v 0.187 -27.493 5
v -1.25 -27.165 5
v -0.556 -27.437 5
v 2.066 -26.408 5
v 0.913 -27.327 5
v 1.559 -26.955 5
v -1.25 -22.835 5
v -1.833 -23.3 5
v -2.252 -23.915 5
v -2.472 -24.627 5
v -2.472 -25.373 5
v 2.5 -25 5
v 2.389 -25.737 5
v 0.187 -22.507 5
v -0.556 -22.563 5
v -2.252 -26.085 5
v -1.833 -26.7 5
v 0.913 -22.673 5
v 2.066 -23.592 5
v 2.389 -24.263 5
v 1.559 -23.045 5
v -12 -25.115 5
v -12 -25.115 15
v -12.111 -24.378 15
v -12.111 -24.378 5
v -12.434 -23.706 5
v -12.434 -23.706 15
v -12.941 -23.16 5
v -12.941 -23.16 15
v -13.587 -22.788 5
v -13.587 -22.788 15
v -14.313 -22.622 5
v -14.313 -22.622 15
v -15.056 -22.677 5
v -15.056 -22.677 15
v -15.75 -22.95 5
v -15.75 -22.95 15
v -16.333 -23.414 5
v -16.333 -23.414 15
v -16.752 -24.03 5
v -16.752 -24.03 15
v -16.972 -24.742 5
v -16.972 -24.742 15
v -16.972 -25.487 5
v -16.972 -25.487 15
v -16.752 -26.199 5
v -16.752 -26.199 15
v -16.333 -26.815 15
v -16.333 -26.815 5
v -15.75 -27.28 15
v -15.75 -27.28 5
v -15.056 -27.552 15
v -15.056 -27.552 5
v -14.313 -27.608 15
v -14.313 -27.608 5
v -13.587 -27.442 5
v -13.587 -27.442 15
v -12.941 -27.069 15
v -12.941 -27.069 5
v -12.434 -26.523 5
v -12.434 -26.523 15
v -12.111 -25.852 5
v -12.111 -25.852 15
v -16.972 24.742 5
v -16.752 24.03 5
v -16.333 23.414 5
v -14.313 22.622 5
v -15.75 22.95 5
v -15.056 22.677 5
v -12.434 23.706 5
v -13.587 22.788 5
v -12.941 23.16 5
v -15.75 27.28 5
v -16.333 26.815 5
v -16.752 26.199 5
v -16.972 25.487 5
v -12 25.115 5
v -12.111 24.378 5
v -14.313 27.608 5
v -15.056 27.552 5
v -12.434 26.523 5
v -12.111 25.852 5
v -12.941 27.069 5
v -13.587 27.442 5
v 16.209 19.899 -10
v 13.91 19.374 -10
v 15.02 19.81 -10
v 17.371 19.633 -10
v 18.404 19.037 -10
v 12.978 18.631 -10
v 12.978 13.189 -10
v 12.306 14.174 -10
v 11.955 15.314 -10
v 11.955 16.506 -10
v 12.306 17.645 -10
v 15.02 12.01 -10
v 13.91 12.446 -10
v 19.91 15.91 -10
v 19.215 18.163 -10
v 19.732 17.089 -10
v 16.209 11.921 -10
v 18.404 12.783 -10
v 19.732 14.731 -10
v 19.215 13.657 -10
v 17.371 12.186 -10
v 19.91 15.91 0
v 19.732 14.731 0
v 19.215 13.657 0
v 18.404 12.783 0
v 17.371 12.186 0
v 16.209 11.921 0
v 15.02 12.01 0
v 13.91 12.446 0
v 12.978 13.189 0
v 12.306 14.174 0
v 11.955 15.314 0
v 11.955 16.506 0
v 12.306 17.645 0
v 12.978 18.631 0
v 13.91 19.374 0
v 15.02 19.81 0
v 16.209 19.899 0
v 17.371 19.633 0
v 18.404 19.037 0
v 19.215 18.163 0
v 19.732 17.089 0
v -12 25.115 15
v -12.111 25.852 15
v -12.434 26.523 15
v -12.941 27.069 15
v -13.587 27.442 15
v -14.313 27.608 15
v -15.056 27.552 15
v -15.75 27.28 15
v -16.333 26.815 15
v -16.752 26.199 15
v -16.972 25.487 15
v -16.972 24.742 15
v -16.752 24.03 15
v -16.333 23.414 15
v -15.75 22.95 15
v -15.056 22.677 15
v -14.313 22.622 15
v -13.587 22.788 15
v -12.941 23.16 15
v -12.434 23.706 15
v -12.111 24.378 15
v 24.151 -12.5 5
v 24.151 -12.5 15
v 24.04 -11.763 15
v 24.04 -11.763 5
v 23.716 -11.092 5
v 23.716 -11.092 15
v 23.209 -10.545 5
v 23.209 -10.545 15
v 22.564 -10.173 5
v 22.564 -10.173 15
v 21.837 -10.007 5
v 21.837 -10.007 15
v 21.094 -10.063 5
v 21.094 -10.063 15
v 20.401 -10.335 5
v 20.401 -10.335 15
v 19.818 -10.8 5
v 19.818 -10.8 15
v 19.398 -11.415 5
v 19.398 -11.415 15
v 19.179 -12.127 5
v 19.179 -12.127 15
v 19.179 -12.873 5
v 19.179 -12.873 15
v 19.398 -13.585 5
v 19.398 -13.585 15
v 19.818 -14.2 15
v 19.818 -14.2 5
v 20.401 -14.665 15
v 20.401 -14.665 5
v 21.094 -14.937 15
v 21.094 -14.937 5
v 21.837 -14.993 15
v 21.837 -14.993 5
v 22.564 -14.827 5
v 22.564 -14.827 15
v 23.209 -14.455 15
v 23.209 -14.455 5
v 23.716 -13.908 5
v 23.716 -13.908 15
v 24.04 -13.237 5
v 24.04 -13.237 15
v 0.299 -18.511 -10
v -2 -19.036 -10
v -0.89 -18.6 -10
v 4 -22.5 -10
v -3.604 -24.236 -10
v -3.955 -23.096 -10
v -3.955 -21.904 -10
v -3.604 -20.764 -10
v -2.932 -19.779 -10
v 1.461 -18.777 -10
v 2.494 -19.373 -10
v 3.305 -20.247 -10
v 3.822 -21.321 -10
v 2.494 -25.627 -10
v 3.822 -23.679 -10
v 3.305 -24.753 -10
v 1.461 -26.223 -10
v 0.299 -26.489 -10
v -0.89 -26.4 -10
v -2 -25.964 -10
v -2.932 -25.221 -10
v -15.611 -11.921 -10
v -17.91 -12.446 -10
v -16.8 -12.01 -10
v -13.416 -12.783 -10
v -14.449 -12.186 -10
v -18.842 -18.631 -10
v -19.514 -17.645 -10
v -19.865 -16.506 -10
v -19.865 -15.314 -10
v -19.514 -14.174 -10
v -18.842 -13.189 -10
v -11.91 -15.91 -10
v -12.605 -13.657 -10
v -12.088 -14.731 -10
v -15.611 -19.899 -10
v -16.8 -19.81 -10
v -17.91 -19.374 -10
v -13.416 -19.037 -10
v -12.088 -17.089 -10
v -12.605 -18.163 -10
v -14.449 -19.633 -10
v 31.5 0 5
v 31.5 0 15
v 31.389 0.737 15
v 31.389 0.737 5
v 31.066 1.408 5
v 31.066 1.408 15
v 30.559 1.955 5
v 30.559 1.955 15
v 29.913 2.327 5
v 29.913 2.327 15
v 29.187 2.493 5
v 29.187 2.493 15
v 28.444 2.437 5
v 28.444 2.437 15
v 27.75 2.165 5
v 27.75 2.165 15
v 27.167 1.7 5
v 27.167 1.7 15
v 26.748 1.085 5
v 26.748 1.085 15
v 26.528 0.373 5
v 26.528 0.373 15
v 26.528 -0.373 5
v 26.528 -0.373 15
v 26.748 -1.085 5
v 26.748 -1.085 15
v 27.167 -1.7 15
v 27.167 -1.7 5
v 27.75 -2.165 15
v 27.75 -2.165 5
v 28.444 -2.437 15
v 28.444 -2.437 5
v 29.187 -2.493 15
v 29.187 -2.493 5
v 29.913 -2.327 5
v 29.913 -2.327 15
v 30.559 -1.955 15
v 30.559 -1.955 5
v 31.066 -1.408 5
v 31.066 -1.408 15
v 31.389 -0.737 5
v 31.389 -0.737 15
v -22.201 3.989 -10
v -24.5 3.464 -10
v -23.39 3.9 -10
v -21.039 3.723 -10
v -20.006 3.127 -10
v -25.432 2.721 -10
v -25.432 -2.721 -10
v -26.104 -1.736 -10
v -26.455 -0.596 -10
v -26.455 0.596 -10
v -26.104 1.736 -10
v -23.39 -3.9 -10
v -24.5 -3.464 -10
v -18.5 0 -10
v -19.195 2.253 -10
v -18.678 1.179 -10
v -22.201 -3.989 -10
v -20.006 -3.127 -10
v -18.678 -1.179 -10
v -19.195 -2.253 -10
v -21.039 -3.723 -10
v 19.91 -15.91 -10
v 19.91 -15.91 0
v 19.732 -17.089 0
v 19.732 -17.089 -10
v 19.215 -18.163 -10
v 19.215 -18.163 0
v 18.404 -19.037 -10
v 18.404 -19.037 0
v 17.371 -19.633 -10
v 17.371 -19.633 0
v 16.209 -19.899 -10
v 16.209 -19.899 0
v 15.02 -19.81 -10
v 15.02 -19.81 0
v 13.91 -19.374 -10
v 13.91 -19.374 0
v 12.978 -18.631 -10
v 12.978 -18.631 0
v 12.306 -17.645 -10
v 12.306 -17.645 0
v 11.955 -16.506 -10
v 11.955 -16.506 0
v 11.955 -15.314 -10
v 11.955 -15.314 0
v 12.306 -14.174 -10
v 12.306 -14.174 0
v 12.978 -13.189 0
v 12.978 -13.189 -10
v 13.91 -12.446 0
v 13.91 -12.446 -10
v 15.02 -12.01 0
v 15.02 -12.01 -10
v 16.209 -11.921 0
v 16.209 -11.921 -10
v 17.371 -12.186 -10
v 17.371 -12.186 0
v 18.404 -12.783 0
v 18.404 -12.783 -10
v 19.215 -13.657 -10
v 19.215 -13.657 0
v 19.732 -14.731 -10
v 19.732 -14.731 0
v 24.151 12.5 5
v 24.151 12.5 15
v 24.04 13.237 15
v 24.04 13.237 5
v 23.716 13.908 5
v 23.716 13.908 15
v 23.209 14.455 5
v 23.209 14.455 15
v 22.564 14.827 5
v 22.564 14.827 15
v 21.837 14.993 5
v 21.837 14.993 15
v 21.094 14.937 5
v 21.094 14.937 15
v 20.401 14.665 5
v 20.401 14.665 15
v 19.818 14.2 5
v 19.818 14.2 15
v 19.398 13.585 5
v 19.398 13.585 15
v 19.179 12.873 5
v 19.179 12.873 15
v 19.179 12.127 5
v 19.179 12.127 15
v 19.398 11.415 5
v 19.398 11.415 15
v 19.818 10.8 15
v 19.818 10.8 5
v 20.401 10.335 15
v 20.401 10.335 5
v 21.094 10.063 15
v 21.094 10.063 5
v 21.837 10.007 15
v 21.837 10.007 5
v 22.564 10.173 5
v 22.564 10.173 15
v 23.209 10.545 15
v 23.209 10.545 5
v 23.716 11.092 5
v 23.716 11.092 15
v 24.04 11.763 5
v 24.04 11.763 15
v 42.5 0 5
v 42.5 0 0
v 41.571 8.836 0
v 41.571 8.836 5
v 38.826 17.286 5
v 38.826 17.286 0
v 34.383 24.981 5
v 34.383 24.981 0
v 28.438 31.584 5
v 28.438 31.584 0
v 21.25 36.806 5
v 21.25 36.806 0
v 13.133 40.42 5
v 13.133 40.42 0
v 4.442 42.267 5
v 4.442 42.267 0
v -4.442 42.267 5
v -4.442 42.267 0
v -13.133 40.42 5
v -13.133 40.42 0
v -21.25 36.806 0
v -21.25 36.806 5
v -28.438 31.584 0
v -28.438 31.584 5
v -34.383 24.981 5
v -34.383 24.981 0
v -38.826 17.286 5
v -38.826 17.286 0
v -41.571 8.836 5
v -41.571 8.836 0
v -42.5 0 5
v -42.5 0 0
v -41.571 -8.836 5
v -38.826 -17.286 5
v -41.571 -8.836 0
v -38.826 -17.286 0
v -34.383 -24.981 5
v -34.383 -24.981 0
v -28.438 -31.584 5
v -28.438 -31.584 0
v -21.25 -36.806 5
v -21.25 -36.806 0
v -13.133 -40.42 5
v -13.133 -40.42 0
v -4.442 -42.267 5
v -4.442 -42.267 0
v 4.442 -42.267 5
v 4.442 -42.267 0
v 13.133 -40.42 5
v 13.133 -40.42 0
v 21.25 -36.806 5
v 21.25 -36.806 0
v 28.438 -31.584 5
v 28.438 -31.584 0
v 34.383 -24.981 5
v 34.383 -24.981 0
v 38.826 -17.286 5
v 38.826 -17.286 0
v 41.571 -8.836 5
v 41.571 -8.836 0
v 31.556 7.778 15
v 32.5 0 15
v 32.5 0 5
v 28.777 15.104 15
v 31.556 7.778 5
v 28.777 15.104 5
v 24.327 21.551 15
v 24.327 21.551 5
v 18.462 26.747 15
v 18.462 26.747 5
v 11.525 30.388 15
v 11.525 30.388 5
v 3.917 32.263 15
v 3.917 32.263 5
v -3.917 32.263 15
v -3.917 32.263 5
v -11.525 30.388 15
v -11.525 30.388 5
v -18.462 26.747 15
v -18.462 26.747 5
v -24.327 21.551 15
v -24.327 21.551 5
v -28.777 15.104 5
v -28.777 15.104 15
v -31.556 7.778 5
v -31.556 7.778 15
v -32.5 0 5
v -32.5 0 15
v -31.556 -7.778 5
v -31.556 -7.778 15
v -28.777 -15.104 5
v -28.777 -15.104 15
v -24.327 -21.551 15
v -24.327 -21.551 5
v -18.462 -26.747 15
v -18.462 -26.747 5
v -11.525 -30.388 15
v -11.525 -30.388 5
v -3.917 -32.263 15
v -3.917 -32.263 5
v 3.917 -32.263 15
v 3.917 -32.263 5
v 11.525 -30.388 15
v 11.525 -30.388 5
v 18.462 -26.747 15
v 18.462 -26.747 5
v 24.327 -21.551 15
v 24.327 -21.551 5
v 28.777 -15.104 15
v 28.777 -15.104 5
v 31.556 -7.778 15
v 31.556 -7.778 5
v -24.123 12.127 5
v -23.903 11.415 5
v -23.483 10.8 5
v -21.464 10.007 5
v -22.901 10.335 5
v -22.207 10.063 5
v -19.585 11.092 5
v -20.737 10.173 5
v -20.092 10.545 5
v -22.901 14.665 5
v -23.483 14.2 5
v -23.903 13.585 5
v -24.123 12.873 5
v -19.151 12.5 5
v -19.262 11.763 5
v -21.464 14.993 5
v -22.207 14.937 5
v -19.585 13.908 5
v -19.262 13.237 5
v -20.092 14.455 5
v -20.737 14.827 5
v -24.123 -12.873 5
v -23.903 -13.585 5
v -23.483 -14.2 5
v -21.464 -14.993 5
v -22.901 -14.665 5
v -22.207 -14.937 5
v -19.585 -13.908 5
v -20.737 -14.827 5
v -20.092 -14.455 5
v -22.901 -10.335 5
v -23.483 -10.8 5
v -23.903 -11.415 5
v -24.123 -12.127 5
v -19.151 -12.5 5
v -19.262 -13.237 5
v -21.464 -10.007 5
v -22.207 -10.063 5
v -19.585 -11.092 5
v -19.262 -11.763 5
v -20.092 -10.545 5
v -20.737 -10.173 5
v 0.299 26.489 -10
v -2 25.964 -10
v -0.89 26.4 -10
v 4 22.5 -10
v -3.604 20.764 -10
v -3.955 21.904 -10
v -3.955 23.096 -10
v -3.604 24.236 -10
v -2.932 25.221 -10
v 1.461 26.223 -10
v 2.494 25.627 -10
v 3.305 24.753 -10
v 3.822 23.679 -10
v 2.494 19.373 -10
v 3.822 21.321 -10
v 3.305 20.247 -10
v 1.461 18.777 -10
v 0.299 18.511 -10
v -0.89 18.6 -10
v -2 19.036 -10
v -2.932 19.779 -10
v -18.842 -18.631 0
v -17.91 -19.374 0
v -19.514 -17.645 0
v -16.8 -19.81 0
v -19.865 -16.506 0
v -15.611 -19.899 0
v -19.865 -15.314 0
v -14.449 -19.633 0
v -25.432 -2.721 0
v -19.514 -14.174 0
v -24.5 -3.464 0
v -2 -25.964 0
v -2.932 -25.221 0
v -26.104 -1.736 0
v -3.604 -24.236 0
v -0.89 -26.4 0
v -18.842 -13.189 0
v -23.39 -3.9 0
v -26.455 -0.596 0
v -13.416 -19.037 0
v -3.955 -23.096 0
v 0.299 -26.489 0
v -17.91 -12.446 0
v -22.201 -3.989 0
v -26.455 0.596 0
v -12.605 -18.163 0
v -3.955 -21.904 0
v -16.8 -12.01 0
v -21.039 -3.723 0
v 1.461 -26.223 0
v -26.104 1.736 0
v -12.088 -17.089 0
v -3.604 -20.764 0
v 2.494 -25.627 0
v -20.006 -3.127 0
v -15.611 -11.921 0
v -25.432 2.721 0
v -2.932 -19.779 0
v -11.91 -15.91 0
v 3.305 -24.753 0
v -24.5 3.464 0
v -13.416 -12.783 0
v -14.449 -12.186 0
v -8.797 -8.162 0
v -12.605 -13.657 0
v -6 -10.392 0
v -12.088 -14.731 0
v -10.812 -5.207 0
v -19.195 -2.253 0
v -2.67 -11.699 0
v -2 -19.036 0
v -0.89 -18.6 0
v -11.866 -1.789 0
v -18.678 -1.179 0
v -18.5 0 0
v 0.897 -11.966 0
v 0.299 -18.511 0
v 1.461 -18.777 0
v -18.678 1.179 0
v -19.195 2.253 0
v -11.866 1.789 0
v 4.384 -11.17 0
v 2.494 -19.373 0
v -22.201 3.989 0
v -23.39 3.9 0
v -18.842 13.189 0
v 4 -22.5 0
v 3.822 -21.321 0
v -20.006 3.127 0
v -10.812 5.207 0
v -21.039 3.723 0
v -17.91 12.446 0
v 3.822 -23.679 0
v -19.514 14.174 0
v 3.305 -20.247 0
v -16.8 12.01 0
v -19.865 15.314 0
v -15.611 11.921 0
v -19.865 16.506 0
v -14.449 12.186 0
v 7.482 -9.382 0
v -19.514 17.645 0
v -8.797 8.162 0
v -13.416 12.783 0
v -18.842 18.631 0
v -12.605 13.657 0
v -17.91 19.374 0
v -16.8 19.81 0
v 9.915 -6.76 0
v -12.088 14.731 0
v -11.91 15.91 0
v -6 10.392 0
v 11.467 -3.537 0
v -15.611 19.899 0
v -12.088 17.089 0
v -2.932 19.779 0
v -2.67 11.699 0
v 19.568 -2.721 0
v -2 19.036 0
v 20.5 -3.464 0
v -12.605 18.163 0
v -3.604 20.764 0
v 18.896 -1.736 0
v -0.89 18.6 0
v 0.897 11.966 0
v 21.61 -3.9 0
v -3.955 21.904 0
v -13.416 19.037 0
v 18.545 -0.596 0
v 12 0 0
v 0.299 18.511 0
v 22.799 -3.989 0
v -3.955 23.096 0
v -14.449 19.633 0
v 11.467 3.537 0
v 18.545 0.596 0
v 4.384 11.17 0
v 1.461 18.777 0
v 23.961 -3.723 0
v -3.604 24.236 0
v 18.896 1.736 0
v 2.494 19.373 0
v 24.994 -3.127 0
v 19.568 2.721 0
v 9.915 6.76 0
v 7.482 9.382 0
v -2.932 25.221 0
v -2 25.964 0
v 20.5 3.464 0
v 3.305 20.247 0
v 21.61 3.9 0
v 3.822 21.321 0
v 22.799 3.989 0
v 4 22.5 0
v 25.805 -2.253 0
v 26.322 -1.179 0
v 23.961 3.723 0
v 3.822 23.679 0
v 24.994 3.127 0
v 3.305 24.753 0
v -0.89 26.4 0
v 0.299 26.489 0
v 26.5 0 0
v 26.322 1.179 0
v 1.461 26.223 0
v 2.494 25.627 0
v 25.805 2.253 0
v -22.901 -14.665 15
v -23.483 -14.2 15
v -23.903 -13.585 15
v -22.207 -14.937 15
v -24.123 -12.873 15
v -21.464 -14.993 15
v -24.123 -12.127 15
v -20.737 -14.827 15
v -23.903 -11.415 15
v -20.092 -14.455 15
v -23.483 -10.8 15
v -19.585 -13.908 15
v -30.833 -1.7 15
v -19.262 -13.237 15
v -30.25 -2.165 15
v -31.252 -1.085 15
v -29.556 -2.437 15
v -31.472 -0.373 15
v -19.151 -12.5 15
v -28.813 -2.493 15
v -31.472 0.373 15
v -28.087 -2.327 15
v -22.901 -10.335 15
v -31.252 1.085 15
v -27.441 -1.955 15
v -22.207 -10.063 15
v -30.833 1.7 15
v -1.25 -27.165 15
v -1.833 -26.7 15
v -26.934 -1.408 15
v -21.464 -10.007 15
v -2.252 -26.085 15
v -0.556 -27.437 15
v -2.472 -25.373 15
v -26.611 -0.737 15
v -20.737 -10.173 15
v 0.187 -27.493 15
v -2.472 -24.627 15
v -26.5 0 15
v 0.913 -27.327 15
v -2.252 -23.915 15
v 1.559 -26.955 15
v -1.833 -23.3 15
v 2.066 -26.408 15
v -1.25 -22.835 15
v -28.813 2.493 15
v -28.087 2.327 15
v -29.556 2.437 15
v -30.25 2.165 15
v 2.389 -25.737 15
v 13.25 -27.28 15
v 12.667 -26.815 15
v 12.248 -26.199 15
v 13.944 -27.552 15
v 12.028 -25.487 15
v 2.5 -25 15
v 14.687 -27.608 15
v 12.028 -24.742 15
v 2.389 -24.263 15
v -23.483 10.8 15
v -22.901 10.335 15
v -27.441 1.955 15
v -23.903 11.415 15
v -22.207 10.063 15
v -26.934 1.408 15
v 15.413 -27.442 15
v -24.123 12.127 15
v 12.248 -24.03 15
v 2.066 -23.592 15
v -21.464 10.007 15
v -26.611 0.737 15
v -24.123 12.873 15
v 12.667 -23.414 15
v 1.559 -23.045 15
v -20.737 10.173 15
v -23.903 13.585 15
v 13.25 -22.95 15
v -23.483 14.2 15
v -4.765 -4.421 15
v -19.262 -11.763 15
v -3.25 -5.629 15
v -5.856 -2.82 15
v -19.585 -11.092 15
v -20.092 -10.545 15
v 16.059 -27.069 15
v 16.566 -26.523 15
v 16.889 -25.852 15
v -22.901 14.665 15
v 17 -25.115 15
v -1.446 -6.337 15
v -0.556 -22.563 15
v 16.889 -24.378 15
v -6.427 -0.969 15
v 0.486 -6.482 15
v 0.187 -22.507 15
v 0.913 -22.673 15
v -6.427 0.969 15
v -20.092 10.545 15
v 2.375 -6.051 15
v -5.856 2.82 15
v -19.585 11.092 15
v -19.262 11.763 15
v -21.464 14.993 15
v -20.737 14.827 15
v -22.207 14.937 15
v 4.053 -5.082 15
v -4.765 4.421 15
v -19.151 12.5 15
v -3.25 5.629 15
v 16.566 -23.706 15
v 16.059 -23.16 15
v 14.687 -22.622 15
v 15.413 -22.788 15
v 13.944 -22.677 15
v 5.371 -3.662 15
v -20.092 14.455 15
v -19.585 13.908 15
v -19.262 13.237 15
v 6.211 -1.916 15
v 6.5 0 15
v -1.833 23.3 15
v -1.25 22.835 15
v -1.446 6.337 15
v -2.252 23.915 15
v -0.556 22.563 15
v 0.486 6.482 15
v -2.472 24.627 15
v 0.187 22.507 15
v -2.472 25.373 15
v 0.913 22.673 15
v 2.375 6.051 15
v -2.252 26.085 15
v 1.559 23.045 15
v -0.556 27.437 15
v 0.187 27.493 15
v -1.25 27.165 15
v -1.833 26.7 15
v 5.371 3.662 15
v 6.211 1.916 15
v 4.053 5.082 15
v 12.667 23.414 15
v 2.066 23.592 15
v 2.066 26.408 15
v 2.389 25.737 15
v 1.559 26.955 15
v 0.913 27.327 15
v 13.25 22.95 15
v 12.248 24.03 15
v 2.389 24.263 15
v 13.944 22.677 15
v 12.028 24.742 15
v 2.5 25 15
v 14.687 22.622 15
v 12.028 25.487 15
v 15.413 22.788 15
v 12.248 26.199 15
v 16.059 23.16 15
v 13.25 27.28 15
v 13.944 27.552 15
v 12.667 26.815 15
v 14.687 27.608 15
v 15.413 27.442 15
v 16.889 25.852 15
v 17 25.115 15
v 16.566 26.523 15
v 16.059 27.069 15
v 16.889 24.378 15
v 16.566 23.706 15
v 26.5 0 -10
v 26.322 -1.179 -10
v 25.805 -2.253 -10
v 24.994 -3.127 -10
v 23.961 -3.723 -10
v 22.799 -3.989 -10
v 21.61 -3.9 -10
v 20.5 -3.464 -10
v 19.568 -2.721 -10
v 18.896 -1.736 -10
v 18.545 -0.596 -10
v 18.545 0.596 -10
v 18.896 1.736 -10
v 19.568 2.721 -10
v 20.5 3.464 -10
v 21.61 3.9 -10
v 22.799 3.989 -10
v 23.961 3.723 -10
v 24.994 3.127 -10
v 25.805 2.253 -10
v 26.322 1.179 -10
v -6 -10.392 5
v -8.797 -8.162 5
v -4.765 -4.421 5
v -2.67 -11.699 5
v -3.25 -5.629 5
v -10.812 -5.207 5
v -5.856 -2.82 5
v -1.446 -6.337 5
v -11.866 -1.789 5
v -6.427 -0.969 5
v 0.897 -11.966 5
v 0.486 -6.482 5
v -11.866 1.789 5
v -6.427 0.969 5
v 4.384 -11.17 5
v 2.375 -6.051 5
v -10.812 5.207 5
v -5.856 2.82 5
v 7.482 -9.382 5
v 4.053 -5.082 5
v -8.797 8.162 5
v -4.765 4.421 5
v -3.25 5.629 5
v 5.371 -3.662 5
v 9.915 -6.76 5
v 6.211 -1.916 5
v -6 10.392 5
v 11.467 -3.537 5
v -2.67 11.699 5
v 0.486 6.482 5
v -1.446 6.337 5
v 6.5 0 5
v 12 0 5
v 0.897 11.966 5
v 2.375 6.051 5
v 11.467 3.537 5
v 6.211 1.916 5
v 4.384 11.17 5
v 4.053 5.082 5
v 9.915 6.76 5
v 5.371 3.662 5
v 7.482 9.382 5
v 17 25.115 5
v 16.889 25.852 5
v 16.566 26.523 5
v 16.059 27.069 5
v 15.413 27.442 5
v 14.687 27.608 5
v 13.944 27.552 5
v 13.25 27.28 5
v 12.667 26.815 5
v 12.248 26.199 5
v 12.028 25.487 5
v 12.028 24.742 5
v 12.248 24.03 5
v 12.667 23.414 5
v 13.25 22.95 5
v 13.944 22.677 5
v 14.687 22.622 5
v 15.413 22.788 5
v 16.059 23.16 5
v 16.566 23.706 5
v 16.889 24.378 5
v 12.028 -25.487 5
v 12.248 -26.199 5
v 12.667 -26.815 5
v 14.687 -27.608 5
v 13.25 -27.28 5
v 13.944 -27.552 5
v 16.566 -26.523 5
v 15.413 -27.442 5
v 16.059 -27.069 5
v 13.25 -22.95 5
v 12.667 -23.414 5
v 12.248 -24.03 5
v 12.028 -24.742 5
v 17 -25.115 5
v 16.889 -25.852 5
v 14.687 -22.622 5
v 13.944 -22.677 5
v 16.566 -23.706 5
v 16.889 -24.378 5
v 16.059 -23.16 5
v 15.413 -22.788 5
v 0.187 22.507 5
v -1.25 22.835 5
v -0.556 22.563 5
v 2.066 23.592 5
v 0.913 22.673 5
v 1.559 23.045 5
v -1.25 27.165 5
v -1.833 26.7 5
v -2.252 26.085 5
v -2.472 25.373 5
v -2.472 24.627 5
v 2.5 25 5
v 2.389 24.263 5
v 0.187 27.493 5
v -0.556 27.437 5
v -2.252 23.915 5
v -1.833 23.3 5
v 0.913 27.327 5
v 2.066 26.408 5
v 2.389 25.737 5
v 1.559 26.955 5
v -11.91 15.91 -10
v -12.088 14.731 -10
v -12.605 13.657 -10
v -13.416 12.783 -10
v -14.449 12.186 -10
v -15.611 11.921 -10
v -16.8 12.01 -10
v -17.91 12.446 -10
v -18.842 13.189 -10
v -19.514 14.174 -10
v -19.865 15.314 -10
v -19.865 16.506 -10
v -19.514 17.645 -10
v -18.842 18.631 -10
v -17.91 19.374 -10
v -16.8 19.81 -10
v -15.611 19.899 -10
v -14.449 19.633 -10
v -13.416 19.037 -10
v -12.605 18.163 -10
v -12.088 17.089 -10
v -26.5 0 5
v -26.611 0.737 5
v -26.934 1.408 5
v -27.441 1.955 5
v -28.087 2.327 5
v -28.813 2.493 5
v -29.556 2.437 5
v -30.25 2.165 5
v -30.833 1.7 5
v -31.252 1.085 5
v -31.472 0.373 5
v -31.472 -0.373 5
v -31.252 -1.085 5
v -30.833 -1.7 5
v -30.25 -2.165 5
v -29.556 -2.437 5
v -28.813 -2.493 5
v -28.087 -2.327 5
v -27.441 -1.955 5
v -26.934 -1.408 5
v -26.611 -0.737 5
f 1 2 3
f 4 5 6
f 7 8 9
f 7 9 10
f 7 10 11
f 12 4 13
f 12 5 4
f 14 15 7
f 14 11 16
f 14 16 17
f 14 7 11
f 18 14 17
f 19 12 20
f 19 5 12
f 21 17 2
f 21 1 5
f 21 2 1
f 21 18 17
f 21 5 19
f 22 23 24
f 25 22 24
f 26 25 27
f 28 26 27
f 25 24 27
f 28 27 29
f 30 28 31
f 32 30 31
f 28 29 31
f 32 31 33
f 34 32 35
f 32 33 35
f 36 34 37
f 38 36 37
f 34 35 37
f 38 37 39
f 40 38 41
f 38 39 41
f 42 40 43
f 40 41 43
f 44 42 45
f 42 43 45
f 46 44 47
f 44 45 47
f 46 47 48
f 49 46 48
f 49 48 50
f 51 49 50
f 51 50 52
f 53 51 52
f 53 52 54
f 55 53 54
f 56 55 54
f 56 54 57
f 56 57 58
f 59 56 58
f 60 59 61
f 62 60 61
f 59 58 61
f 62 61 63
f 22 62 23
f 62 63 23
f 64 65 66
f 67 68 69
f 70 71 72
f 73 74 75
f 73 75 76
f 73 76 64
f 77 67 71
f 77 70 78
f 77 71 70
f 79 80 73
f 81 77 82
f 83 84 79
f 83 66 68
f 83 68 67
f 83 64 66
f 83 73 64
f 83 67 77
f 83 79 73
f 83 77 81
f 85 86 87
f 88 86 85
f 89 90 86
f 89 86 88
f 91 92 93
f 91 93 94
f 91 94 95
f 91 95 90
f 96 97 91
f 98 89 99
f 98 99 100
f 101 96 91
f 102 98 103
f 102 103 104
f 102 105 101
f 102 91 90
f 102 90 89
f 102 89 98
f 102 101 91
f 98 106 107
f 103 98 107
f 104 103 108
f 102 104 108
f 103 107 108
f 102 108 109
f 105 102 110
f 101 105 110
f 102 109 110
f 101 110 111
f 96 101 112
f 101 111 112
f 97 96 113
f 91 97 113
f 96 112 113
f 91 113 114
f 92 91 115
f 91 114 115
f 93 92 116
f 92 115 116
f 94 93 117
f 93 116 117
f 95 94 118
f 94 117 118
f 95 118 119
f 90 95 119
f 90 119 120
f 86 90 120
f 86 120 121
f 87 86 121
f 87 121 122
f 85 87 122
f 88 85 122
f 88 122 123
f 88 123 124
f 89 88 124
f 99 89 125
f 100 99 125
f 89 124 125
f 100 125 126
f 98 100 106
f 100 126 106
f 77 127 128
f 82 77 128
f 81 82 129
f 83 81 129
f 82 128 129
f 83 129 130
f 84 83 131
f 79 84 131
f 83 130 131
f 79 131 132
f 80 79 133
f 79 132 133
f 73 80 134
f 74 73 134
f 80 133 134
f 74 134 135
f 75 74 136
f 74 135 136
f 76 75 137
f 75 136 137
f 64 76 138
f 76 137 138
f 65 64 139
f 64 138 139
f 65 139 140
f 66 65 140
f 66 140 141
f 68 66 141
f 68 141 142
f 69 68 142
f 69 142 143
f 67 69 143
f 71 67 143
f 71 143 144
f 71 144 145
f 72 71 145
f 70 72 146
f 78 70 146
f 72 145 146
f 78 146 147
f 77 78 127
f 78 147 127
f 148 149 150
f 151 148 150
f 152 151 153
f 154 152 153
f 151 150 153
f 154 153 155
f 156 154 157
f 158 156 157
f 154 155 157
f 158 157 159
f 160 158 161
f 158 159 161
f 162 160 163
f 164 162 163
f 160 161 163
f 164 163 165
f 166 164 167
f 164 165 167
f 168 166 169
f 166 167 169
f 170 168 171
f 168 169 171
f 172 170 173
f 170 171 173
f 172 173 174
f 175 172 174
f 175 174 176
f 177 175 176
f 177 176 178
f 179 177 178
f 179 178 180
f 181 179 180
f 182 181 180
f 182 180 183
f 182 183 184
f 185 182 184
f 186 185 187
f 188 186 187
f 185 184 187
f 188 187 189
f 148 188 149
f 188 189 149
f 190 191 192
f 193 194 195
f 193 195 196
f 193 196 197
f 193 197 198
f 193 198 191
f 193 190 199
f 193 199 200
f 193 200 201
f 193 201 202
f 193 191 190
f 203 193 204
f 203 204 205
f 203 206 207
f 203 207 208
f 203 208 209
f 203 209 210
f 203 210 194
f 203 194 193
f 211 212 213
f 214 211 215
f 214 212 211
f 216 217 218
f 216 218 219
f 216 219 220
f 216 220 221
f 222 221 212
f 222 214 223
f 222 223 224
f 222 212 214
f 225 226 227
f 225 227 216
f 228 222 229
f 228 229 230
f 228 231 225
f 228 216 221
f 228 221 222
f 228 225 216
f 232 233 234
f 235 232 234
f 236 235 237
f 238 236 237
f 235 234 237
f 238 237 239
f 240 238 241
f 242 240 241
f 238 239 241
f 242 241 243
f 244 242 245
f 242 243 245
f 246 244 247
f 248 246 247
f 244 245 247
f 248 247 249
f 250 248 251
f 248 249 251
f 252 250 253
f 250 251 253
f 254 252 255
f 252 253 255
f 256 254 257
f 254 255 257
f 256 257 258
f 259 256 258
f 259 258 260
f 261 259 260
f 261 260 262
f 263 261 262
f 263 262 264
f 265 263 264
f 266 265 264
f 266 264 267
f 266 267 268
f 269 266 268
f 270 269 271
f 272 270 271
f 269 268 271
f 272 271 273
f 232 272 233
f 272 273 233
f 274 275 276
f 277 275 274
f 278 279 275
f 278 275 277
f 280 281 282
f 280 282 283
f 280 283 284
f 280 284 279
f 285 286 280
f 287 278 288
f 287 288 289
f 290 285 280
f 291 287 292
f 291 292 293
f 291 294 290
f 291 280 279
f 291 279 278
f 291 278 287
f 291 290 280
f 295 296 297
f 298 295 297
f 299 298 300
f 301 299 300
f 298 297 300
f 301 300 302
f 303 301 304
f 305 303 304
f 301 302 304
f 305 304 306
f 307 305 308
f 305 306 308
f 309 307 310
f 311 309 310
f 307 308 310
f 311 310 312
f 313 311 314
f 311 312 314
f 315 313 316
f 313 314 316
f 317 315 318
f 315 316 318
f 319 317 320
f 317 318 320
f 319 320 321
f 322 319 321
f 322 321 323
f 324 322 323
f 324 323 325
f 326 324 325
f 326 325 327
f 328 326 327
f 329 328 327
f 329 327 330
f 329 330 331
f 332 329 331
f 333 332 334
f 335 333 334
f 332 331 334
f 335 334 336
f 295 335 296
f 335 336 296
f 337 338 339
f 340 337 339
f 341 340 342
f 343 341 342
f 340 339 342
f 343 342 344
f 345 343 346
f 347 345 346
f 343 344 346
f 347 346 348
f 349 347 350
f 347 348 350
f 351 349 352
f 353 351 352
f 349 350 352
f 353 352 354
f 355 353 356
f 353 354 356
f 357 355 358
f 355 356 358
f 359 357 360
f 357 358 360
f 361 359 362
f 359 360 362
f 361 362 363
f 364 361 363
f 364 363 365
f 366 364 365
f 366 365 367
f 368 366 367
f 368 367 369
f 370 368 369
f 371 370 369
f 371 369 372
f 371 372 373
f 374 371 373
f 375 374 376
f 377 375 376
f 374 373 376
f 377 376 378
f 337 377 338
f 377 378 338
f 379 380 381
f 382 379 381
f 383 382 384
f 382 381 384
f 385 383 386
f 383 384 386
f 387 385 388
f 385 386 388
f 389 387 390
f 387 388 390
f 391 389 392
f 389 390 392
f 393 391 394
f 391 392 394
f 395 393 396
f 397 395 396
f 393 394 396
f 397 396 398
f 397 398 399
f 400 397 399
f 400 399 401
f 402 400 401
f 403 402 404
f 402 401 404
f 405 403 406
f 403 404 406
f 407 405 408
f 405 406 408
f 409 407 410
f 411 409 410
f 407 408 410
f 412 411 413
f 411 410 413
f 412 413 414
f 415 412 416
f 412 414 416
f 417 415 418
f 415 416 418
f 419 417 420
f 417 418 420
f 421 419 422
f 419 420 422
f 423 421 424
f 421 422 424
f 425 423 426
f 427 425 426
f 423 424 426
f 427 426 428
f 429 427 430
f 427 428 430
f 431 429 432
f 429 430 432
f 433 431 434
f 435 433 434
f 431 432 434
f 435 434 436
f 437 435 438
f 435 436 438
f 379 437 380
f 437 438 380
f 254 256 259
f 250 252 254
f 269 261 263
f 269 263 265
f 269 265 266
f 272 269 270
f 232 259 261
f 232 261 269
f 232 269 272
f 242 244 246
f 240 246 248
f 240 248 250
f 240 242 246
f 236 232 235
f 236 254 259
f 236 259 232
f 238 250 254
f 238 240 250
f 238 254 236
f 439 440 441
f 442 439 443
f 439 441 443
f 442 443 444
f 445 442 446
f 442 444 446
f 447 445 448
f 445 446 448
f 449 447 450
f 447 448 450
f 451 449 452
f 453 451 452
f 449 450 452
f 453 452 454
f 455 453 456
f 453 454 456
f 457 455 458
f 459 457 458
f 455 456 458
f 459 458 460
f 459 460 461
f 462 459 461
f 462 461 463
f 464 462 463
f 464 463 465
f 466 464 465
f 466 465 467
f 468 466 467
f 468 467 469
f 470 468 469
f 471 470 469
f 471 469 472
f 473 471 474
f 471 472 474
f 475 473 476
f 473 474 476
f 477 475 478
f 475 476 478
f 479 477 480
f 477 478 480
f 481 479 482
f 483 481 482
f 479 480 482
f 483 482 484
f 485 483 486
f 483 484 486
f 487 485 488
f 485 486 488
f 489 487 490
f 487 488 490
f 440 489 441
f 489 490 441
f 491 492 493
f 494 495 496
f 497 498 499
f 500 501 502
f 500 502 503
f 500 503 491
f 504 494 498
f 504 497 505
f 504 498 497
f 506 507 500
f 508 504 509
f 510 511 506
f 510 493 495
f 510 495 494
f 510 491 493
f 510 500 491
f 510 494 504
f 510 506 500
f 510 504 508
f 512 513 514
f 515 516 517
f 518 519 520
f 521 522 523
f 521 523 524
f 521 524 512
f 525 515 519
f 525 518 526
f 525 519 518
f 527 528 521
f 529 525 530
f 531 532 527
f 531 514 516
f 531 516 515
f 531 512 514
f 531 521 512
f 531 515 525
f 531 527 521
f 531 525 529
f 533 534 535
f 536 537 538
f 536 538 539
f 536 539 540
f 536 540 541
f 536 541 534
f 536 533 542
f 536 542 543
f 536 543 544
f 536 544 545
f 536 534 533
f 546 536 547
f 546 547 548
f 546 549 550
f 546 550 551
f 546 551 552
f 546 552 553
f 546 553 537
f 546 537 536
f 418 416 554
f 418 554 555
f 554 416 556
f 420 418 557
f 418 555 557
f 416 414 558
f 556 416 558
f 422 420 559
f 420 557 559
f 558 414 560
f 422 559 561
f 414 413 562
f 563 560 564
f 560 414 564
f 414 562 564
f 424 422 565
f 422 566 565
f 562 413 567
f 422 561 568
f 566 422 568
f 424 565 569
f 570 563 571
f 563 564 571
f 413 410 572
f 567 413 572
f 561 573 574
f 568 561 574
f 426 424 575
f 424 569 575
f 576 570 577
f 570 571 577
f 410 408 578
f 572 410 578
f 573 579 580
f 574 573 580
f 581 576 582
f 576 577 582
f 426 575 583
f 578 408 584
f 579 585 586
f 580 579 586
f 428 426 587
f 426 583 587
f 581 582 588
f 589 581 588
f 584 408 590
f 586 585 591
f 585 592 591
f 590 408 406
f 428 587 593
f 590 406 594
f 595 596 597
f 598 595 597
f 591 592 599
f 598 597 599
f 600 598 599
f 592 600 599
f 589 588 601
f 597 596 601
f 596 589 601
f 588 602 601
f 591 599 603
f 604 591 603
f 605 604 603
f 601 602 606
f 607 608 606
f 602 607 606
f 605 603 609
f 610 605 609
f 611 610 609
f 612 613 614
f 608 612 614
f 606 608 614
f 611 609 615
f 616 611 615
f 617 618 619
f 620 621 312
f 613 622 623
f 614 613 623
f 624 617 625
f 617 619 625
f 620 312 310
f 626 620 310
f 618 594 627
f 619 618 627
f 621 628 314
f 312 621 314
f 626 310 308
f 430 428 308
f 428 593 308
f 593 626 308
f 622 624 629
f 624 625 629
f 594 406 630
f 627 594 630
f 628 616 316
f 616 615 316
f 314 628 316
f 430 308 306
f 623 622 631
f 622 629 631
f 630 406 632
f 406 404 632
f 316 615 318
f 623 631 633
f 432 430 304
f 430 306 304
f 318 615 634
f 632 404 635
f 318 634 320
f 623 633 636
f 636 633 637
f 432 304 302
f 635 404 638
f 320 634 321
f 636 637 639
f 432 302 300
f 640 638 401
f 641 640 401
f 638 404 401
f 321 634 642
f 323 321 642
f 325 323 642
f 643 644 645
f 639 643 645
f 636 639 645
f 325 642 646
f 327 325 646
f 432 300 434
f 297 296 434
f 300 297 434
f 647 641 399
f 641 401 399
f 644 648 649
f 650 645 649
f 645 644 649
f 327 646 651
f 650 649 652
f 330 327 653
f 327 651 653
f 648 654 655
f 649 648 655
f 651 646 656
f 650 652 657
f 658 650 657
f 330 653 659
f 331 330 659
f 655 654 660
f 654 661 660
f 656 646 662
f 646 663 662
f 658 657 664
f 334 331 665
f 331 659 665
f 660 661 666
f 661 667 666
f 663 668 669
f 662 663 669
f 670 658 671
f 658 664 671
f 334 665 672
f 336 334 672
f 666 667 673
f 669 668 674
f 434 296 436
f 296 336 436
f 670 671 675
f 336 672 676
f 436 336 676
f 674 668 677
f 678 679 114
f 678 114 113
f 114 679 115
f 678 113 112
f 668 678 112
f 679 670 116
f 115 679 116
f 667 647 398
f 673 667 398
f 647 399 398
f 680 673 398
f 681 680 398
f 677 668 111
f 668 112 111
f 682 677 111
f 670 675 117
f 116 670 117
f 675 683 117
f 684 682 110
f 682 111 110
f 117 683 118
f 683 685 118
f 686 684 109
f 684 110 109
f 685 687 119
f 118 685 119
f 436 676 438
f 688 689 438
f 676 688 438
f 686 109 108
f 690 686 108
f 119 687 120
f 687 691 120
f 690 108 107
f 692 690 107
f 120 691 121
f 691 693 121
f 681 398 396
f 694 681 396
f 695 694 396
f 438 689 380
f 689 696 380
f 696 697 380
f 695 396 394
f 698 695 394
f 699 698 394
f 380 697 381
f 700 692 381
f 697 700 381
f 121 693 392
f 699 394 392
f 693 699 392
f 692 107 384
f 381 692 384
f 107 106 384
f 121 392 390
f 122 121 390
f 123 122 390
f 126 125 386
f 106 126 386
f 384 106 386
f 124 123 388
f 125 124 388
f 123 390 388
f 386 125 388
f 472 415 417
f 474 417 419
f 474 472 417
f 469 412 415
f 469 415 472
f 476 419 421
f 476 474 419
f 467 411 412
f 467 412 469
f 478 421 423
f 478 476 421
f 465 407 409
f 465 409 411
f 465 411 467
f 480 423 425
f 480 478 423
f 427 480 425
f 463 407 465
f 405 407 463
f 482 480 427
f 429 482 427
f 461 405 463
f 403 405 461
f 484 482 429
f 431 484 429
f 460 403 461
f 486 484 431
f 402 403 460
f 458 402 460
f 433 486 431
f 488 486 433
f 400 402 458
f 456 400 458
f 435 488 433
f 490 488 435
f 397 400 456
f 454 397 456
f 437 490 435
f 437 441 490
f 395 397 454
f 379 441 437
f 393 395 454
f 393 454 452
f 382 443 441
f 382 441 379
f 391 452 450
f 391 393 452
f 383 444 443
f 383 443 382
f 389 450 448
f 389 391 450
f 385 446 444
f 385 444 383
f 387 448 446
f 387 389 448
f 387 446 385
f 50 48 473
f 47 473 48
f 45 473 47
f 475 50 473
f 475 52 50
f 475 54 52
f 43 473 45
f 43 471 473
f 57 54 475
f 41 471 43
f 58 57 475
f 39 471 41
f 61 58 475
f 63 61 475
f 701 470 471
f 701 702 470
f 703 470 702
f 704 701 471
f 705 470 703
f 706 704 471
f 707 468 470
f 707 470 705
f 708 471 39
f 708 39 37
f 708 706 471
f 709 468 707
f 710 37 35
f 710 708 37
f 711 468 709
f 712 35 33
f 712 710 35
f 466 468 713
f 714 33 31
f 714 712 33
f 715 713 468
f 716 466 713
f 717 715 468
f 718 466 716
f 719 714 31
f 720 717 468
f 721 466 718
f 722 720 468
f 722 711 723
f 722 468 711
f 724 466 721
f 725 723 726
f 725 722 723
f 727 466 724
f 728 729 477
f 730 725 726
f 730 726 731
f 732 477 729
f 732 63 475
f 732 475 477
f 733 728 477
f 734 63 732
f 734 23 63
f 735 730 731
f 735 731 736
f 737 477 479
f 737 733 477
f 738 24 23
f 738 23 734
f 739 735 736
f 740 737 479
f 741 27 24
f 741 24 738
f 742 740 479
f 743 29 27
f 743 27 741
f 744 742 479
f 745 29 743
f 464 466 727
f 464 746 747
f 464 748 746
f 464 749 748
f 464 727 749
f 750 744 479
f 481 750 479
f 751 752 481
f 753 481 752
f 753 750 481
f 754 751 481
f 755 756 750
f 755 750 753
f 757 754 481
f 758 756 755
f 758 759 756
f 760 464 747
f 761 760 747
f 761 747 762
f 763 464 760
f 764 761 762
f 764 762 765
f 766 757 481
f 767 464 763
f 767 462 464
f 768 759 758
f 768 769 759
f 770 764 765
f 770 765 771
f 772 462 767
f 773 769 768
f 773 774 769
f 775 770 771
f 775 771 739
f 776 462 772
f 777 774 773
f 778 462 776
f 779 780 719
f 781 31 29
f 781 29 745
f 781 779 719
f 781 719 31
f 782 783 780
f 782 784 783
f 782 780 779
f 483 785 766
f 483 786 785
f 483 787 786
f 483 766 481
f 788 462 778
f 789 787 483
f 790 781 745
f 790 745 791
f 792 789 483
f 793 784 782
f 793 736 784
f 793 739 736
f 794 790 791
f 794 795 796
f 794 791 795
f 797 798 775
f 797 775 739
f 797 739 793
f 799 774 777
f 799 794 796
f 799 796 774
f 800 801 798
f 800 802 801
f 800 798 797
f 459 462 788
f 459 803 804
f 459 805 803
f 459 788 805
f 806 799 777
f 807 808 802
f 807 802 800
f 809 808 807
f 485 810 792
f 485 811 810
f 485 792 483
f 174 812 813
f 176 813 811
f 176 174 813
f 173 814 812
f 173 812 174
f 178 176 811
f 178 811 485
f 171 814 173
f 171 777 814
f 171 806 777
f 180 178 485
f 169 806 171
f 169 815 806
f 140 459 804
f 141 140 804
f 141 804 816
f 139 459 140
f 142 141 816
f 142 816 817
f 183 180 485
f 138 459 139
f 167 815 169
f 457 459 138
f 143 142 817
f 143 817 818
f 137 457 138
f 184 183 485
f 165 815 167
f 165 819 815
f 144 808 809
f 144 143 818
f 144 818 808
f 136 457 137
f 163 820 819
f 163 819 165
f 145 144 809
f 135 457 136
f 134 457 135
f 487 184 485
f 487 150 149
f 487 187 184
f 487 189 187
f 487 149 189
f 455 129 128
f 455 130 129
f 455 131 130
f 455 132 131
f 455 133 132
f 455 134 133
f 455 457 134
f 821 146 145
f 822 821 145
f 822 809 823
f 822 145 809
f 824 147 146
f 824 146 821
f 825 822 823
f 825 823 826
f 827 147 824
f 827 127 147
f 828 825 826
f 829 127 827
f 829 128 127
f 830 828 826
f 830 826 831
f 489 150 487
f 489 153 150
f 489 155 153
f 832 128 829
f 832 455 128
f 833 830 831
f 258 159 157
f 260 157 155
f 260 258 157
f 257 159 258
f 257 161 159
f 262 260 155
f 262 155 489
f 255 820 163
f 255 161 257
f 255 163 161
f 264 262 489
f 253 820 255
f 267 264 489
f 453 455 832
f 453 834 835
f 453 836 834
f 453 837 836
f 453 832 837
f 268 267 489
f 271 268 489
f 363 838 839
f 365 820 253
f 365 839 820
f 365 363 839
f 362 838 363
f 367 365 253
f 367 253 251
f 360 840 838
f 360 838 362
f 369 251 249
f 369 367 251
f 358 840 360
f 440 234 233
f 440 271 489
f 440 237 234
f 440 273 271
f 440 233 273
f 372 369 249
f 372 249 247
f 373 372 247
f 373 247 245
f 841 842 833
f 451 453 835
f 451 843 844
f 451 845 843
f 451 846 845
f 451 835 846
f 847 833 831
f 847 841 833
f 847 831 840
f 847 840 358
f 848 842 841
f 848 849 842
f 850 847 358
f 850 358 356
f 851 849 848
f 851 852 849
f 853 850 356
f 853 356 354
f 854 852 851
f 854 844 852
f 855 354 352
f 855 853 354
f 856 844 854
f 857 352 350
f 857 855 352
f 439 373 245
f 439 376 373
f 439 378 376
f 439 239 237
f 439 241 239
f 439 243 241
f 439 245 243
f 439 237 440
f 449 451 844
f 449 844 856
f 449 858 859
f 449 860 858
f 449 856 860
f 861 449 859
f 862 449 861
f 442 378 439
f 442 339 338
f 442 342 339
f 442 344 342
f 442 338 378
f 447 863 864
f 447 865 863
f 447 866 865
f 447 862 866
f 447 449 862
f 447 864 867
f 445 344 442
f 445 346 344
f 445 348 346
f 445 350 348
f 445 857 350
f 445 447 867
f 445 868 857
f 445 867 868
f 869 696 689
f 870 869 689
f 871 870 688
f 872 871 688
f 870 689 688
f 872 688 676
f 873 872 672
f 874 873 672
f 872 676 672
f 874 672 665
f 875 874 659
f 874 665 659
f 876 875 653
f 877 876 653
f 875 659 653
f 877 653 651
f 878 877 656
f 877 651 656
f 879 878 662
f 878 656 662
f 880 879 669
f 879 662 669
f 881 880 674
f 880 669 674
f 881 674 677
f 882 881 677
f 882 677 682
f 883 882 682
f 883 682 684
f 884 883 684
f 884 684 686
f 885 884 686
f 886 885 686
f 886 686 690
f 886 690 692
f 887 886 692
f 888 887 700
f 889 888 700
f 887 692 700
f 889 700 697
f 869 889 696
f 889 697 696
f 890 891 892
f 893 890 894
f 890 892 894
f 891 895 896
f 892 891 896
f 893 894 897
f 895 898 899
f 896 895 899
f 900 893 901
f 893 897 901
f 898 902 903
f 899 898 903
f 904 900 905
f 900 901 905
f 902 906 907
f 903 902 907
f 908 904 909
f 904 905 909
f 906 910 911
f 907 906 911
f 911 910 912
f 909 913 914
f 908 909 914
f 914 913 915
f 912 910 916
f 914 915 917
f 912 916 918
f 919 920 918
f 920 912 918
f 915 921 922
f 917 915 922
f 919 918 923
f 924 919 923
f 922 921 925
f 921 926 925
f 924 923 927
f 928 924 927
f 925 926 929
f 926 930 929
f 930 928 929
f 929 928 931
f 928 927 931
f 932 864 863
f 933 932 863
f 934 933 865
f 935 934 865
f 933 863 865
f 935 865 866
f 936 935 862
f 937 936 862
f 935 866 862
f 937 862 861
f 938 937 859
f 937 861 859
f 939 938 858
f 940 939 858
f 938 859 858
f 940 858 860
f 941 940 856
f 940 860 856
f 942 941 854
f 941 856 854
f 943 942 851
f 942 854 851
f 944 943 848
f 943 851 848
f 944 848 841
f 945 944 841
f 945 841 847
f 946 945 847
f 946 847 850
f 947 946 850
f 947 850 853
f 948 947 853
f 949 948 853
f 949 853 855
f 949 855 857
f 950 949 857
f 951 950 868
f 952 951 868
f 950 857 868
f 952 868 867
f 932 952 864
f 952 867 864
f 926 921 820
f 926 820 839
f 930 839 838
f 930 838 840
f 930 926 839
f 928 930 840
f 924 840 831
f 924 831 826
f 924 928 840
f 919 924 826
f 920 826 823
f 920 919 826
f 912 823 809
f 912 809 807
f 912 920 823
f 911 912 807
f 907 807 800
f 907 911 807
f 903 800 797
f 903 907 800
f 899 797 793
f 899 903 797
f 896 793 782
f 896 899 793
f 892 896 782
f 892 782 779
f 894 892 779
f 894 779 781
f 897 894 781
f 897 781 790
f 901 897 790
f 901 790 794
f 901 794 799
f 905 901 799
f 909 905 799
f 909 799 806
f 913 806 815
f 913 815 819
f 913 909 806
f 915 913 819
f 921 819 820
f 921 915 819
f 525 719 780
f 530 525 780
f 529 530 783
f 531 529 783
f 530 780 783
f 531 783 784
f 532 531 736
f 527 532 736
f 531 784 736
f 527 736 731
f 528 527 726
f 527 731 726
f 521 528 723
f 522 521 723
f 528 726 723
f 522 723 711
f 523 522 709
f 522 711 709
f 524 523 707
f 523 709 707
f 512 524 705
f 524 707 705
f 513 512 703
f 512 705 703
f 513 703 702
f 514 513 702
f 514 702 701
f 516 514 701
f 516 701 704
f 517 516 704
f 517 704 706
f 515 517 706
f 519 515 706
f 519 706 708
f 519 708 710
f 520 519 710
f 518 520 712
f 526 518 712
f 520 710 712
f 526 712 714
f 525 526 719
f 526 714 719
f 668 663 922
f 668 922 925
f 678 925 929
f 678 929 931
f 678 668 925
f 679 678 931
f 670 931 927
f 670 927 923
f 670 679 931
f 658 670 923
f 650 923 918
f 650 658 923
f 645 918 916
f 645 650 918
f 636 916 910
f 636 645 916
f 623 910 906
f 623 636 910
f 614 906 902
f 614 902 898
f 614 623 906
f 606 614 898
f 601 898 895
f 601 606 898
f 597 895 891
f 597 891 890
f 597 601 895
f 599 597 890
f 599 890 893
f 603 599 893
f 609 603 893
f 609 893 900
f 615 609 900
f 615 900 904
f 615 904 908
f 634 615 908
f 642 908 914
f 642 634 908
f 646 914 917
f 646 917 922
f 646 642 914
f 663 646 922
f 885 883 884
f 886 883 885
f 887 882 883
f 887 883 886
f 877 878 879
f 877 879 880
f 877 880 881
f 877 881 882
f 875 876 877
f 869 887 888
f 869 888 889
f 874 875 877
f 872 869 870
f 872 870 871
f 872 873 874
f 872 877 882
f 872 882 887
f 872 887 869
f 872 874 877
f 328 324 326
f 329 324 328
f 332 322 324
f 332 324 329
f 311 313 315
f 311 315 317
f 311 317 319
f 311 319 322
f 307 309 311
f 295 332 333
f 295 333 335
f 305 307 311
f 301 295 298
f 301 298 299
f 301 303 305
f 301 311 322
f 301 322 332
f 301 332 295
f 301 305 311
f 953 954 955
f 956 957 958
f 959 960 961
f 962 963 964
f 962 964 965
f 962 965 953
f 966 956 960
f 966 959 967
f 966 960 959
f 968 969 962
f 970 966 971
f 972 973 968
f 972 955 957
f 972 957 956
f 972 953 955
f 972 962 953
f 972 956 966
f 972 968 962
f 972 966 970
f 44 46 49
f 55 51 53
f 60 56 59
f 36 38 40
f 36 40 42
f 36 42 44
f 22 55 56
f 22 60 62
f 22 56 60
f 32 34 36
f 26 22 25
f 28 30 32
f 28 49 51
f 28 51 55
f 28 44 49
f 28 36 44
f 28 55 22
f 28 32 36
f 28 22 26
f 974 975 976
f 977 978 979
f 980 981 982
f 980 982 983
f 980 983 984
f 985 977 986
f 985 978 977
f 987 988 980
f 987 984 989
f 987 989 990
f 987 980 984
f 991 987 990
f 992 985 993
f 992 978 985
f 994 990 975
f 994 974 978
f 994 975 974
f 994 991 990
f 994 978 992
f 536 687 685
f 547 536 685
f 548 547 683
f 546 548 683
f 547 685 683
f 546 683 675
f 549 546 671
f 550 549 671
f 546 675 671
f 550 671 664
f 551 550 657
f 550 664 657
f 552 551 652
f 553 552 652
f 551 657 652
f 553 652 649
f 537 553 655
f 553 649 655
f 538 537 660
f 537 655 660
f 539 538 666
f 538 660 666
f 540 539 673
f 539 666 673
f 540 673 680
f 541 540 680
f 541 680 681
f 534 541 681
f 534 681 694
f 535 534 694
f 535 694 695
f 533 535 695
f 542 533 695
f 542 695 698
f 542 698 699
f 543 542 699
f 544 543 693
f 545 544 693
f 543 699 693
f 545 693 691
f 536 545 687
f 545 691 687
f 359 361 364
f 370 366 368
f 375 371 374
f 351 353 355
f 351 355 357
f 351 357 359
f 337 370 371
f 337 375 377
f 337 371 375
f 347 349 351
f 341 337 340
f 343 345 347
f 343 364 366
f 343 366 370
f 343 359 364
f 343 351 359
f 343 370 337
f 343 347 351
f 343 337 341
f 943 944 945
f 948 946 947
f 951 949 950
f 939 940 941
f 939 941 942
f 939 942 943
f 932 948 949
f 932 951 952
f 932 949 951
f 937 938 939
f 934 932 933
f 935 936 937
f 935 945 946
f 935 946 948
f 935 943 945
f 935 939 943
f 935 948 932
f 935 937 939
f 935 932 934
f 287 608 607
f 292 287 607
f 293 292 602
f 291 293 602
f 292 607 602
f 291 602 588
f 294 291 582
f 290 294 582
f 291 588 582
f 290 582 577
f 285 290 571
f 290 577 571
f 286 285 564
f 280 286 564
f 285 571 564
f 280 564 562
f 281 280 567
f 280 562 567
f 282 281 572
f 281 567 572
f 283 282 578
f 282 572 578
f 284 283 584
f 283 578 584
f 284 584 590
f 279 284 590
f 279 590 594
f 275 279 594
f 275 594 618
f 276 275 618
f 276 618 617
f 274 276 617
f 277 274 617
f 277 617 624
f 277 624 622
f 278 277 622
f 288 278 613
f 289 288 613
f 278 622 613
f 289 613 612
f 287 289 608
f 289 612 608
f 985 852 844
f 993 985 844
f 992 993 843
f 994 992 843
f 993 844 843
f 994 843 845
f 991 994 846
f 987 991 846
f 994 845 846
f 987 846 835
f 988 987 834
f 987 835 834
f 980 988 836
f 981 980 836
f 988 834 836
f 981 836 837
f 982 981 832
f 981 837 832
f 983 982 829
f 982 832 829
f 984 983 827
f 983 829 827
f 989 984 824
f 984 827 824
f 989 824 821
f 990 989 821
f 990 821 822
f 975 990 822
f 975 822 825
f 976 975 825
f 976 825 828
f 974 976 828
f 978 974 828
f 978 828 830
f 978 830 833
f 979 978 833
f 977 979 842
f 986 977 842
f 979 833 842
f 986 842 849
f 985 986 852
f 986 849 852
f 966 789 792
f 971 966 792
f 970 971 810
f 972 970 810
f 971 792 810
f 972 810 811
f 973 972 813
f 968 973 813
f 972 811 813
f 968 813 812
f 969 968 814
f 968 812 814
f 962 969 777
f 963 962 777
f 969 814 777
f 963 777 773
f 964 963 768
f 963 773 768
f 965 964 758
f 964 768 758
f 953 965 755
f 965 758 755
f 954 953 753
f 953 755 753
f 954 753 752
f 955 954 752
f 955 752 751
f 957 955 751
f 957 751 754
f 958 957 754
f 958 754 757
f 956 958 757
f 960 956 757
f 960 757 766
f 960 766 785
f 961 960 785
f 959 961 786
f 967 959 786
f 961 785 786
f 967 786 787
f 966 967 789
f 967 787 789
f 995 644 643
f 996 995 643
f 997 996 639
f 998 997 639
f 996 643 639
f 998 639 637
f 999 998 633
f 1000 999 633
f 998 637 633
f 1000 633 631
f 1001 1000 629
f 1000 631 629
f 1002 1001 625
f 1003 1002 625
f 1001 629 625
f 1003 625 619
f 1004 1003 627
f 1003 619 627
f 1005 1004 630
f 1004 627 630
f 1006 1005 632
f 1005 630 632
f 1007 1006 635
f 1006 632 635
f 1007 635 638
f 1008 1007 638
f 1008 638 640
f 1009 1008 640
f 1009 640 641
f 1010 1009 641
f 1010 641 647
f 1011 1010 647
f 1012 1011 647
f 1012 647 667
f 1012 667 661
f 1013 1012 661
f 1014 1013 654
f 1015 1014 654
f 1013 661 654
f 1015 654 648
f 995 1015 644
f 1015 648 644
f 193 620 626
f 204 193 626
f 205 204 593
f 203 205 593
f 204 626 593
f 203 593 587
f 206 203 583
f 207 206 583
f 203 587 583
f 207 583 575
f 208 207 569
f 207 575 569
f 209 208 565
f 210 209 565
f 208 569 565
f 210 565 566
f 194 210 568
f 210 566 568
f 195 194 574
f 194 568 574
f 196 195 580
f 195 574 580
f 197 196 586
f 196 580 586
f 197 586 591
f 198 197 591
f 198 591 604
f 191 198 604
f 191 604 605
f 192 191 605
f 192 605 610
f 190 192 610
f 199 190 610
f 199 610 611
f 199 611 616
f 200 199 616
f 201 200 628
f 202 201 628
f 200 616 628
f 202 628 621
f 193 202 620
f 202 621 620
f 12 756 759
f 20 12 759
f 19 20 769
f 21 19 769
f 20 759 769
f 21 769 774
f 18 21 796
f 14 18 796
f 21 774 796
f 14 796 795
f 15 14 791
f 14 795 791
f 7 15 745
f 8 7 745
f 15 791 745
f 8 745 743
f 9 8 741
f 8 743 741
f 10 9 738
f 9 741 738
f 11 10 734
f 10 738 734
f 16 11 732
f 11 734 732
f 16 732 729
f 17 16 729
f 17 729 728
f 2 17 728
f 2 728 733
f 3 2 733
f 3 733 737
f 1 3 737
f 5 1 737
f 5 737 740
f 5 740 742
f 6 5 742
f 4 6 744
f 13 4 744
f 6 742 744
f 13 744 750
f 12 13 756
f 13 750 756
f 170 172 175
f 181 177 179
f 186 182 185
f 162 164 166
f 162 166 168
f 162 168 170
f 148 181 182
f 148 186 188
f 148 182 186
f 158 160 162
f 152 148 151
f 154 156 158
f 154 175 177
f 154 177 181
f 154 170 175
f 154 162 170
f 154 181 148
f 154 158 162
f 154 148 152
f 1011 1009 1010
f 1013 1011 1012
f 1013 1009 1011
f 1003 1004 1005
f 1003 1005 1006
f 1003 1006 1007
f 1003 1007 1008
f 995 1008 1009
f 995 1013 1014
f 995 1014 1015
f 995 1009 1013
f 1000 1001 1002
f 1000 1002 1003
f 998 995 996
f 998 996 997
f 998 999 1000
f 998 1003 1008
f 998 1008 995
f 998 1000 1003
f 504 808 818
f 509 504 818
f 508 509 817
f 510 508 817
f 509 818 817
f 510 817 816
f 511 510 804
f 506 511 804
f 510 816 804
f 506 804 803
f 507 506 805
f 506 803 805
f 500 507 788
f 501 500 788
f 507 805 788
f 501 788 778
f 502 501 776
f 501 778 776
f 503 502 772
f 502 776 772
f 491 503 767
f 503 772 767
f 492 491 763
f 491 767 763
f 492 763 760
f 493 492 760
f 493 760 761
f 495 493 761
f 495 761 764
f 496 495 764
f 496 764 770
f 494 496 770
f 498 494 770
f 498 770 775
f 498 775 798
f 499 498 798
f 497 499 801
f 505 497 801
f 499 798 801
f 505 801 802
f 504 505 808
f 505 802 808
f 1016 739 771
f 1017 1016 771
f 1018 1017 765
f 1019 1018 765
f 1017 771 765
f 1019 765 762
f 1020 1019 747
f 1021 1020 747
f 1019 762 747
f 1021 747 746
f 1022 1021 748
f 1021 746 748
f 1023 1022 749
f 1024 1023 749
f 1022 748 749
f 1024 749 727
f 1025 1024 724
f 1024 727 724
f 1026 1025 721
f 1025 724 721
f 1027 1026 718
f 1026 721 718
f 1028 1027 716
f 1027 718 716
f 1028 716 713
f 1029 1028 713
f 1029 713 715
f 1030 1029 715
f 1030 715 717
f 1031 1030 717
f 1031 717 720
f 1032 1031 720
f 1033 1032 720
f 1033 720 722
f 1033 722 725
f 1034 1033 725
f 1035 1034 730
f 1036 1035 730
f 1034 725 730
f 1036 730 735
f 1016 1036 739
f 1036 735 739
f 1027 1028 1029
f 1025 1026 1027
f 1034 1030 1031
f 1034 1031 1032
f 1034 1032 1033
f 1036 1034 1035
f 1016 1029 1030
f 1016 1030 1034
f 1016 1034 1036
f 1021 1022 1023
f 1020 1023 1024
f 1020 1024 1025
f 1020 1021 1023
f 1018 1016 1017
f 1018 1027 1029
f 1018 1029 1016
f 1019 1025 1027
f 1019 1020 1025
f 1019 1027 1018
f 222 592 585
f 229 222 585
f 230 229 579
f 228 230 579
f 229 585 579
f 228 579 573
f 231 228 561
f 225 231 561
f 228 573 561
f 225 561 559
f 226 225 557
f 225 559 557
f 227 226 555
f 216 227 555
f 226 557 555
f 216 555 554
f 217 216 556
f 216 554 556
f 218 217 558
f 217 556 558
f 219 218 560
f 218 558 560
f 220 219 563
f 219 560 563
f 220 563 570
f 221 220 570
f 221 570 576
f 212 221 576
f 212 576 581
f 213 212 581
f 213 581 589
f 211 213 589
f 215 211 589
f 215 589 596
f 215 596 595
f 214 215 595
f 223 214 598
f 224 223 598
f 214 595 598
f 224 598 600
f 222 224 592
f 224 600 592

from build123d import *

# Parameters (mm, degrees)
SKETCH1_R           = 42.5
SKETCH1_R_2         = 12
BOSS_EXTRUDE1_DEPTH = 5
SKETCH2_R           = 32.5
SKETCH2_R_2         = 6.5
BOSS_EXTRUDE2_DEPTH = 10
SKETCH3_R           = 4
BOSS_EXTRUDE3_DEPTH = 10
SKETCH5_R           = 2.5
CUT_EXTRUDE1_DEPTH  = 10
SKETCH7_R           = 2.5
CUT_EXTRUDE2_DEPTH  = 10


with BuildPart() as part:
    # Sketch1 → Boss-Extrude1 (new body)
    with BuildSketch(Plane.XY):
        Circle(SKETCH1_R)
        Circle(SKETCH1_R_2, mode=Mode.SUBTRACT)
    extrude(amount=BOSS_EXTRUDE1_DEPTH)

    # Sketch2 → Boss-Extrude2 (add)
    with BuildSketch(Plane.XY.offset(5)):
        Circle(SKETCH2_R)
        Circle(SKETCH2_R_2, mode=Mode.SUBTRACT)
    extrude(amount=BOSS_EXTRUDE2_DEPTH)

    # Sketch3 → Boss-Extrude3 (add)
    with BuildSketch(Plane(origin=(0, 0, 0), x_dir=(-1, 0, 0), z_dir=(0, 0, -1))):
        with Locations(Location((0, 22.5, 0), (0, 0, 180))):
            Circle(SKETCH3_R)
        with Locations(Location((15.909902577, 15.909902577, 0), (0, 0, 180))):
            Circle(SKETCH3_R)
        with Locations(Location((22.5, 0, 0), (0, 0, 180))):
            Circle(SKETCH3_R)
        with Locations(Location((15.909902577, -15.909902577, 0), (0, 0, 180))):
            Circle(SKETCH3_R)
        with Locations(Location((0, -22.5, 0), (0, 0, 180))):
            Circle(SKETCH3_R)
        with Locations(Location((-15.909902577, -15.909902577, 0), (0, 0, 180))):
            Circle(SKETCH3_R)
        with Locations(Location((-22.5, 0, 0), (0, 0, 180))):
            Circle(SKETCH3_R)
        with Locations(Location((-15.909902577, 15.909902577, 0), (0, 0, 180))):
            Circle(SKETCH3_R)
    extrude(amount=BOSS_EXTRUDE3_DEPTH)

    # Sketch5 → Cut-Extrude1 (cut)
    with BuildSketch(Plane.XY.offset(15)):
        with Locations((0, 25)):
            Circle(SKETCH5_R)
        with Locations((21.650635095, 12.5)):
            Circle(SKETCH5_R)
        with Locations((21.650635095, -12.5)):
            Circle(SKETCH5_R)
        with Locations((0, -25)):
            Circle(SKETCH5_R)
        with Locations((-21.650635095, -12.5)):
            Circle(SKETCH5_R)
        with Locations((-21.650635095, 12.5)):
            Circle(SKETCH5_R)
    extrude(amount=-CUT_EXTRUDE1_DEPTH, mode=Mode.SUBTRACT)

    # Sketch7 → Cut-Extrude2 (cut)
    with BuildSketch(Plane.XY.offset(15)):
        with Locations((29, 0)):
            Circle(SKETCH7_R)
        with Locations((14.5, -25.11473671)):
            Circle(SKETCH7_R)
        with Locations((-14.5, -25.11473671)):
            Circle(SKETCH7_R)
        with Locations((-29, 0)):
            Circle(SKETCH7_R)
        with Locations((-14.5, 25.11473671)):
            Circle(SKETCH7_R)
        with Locations((14.5, 25.11473671)):
            Circle(SKETCH7_R)
    extrude(amount=-CUT_EXTRUDE2_DEPTH, mode=Mode.SUBTRACT)


solid = part.part
